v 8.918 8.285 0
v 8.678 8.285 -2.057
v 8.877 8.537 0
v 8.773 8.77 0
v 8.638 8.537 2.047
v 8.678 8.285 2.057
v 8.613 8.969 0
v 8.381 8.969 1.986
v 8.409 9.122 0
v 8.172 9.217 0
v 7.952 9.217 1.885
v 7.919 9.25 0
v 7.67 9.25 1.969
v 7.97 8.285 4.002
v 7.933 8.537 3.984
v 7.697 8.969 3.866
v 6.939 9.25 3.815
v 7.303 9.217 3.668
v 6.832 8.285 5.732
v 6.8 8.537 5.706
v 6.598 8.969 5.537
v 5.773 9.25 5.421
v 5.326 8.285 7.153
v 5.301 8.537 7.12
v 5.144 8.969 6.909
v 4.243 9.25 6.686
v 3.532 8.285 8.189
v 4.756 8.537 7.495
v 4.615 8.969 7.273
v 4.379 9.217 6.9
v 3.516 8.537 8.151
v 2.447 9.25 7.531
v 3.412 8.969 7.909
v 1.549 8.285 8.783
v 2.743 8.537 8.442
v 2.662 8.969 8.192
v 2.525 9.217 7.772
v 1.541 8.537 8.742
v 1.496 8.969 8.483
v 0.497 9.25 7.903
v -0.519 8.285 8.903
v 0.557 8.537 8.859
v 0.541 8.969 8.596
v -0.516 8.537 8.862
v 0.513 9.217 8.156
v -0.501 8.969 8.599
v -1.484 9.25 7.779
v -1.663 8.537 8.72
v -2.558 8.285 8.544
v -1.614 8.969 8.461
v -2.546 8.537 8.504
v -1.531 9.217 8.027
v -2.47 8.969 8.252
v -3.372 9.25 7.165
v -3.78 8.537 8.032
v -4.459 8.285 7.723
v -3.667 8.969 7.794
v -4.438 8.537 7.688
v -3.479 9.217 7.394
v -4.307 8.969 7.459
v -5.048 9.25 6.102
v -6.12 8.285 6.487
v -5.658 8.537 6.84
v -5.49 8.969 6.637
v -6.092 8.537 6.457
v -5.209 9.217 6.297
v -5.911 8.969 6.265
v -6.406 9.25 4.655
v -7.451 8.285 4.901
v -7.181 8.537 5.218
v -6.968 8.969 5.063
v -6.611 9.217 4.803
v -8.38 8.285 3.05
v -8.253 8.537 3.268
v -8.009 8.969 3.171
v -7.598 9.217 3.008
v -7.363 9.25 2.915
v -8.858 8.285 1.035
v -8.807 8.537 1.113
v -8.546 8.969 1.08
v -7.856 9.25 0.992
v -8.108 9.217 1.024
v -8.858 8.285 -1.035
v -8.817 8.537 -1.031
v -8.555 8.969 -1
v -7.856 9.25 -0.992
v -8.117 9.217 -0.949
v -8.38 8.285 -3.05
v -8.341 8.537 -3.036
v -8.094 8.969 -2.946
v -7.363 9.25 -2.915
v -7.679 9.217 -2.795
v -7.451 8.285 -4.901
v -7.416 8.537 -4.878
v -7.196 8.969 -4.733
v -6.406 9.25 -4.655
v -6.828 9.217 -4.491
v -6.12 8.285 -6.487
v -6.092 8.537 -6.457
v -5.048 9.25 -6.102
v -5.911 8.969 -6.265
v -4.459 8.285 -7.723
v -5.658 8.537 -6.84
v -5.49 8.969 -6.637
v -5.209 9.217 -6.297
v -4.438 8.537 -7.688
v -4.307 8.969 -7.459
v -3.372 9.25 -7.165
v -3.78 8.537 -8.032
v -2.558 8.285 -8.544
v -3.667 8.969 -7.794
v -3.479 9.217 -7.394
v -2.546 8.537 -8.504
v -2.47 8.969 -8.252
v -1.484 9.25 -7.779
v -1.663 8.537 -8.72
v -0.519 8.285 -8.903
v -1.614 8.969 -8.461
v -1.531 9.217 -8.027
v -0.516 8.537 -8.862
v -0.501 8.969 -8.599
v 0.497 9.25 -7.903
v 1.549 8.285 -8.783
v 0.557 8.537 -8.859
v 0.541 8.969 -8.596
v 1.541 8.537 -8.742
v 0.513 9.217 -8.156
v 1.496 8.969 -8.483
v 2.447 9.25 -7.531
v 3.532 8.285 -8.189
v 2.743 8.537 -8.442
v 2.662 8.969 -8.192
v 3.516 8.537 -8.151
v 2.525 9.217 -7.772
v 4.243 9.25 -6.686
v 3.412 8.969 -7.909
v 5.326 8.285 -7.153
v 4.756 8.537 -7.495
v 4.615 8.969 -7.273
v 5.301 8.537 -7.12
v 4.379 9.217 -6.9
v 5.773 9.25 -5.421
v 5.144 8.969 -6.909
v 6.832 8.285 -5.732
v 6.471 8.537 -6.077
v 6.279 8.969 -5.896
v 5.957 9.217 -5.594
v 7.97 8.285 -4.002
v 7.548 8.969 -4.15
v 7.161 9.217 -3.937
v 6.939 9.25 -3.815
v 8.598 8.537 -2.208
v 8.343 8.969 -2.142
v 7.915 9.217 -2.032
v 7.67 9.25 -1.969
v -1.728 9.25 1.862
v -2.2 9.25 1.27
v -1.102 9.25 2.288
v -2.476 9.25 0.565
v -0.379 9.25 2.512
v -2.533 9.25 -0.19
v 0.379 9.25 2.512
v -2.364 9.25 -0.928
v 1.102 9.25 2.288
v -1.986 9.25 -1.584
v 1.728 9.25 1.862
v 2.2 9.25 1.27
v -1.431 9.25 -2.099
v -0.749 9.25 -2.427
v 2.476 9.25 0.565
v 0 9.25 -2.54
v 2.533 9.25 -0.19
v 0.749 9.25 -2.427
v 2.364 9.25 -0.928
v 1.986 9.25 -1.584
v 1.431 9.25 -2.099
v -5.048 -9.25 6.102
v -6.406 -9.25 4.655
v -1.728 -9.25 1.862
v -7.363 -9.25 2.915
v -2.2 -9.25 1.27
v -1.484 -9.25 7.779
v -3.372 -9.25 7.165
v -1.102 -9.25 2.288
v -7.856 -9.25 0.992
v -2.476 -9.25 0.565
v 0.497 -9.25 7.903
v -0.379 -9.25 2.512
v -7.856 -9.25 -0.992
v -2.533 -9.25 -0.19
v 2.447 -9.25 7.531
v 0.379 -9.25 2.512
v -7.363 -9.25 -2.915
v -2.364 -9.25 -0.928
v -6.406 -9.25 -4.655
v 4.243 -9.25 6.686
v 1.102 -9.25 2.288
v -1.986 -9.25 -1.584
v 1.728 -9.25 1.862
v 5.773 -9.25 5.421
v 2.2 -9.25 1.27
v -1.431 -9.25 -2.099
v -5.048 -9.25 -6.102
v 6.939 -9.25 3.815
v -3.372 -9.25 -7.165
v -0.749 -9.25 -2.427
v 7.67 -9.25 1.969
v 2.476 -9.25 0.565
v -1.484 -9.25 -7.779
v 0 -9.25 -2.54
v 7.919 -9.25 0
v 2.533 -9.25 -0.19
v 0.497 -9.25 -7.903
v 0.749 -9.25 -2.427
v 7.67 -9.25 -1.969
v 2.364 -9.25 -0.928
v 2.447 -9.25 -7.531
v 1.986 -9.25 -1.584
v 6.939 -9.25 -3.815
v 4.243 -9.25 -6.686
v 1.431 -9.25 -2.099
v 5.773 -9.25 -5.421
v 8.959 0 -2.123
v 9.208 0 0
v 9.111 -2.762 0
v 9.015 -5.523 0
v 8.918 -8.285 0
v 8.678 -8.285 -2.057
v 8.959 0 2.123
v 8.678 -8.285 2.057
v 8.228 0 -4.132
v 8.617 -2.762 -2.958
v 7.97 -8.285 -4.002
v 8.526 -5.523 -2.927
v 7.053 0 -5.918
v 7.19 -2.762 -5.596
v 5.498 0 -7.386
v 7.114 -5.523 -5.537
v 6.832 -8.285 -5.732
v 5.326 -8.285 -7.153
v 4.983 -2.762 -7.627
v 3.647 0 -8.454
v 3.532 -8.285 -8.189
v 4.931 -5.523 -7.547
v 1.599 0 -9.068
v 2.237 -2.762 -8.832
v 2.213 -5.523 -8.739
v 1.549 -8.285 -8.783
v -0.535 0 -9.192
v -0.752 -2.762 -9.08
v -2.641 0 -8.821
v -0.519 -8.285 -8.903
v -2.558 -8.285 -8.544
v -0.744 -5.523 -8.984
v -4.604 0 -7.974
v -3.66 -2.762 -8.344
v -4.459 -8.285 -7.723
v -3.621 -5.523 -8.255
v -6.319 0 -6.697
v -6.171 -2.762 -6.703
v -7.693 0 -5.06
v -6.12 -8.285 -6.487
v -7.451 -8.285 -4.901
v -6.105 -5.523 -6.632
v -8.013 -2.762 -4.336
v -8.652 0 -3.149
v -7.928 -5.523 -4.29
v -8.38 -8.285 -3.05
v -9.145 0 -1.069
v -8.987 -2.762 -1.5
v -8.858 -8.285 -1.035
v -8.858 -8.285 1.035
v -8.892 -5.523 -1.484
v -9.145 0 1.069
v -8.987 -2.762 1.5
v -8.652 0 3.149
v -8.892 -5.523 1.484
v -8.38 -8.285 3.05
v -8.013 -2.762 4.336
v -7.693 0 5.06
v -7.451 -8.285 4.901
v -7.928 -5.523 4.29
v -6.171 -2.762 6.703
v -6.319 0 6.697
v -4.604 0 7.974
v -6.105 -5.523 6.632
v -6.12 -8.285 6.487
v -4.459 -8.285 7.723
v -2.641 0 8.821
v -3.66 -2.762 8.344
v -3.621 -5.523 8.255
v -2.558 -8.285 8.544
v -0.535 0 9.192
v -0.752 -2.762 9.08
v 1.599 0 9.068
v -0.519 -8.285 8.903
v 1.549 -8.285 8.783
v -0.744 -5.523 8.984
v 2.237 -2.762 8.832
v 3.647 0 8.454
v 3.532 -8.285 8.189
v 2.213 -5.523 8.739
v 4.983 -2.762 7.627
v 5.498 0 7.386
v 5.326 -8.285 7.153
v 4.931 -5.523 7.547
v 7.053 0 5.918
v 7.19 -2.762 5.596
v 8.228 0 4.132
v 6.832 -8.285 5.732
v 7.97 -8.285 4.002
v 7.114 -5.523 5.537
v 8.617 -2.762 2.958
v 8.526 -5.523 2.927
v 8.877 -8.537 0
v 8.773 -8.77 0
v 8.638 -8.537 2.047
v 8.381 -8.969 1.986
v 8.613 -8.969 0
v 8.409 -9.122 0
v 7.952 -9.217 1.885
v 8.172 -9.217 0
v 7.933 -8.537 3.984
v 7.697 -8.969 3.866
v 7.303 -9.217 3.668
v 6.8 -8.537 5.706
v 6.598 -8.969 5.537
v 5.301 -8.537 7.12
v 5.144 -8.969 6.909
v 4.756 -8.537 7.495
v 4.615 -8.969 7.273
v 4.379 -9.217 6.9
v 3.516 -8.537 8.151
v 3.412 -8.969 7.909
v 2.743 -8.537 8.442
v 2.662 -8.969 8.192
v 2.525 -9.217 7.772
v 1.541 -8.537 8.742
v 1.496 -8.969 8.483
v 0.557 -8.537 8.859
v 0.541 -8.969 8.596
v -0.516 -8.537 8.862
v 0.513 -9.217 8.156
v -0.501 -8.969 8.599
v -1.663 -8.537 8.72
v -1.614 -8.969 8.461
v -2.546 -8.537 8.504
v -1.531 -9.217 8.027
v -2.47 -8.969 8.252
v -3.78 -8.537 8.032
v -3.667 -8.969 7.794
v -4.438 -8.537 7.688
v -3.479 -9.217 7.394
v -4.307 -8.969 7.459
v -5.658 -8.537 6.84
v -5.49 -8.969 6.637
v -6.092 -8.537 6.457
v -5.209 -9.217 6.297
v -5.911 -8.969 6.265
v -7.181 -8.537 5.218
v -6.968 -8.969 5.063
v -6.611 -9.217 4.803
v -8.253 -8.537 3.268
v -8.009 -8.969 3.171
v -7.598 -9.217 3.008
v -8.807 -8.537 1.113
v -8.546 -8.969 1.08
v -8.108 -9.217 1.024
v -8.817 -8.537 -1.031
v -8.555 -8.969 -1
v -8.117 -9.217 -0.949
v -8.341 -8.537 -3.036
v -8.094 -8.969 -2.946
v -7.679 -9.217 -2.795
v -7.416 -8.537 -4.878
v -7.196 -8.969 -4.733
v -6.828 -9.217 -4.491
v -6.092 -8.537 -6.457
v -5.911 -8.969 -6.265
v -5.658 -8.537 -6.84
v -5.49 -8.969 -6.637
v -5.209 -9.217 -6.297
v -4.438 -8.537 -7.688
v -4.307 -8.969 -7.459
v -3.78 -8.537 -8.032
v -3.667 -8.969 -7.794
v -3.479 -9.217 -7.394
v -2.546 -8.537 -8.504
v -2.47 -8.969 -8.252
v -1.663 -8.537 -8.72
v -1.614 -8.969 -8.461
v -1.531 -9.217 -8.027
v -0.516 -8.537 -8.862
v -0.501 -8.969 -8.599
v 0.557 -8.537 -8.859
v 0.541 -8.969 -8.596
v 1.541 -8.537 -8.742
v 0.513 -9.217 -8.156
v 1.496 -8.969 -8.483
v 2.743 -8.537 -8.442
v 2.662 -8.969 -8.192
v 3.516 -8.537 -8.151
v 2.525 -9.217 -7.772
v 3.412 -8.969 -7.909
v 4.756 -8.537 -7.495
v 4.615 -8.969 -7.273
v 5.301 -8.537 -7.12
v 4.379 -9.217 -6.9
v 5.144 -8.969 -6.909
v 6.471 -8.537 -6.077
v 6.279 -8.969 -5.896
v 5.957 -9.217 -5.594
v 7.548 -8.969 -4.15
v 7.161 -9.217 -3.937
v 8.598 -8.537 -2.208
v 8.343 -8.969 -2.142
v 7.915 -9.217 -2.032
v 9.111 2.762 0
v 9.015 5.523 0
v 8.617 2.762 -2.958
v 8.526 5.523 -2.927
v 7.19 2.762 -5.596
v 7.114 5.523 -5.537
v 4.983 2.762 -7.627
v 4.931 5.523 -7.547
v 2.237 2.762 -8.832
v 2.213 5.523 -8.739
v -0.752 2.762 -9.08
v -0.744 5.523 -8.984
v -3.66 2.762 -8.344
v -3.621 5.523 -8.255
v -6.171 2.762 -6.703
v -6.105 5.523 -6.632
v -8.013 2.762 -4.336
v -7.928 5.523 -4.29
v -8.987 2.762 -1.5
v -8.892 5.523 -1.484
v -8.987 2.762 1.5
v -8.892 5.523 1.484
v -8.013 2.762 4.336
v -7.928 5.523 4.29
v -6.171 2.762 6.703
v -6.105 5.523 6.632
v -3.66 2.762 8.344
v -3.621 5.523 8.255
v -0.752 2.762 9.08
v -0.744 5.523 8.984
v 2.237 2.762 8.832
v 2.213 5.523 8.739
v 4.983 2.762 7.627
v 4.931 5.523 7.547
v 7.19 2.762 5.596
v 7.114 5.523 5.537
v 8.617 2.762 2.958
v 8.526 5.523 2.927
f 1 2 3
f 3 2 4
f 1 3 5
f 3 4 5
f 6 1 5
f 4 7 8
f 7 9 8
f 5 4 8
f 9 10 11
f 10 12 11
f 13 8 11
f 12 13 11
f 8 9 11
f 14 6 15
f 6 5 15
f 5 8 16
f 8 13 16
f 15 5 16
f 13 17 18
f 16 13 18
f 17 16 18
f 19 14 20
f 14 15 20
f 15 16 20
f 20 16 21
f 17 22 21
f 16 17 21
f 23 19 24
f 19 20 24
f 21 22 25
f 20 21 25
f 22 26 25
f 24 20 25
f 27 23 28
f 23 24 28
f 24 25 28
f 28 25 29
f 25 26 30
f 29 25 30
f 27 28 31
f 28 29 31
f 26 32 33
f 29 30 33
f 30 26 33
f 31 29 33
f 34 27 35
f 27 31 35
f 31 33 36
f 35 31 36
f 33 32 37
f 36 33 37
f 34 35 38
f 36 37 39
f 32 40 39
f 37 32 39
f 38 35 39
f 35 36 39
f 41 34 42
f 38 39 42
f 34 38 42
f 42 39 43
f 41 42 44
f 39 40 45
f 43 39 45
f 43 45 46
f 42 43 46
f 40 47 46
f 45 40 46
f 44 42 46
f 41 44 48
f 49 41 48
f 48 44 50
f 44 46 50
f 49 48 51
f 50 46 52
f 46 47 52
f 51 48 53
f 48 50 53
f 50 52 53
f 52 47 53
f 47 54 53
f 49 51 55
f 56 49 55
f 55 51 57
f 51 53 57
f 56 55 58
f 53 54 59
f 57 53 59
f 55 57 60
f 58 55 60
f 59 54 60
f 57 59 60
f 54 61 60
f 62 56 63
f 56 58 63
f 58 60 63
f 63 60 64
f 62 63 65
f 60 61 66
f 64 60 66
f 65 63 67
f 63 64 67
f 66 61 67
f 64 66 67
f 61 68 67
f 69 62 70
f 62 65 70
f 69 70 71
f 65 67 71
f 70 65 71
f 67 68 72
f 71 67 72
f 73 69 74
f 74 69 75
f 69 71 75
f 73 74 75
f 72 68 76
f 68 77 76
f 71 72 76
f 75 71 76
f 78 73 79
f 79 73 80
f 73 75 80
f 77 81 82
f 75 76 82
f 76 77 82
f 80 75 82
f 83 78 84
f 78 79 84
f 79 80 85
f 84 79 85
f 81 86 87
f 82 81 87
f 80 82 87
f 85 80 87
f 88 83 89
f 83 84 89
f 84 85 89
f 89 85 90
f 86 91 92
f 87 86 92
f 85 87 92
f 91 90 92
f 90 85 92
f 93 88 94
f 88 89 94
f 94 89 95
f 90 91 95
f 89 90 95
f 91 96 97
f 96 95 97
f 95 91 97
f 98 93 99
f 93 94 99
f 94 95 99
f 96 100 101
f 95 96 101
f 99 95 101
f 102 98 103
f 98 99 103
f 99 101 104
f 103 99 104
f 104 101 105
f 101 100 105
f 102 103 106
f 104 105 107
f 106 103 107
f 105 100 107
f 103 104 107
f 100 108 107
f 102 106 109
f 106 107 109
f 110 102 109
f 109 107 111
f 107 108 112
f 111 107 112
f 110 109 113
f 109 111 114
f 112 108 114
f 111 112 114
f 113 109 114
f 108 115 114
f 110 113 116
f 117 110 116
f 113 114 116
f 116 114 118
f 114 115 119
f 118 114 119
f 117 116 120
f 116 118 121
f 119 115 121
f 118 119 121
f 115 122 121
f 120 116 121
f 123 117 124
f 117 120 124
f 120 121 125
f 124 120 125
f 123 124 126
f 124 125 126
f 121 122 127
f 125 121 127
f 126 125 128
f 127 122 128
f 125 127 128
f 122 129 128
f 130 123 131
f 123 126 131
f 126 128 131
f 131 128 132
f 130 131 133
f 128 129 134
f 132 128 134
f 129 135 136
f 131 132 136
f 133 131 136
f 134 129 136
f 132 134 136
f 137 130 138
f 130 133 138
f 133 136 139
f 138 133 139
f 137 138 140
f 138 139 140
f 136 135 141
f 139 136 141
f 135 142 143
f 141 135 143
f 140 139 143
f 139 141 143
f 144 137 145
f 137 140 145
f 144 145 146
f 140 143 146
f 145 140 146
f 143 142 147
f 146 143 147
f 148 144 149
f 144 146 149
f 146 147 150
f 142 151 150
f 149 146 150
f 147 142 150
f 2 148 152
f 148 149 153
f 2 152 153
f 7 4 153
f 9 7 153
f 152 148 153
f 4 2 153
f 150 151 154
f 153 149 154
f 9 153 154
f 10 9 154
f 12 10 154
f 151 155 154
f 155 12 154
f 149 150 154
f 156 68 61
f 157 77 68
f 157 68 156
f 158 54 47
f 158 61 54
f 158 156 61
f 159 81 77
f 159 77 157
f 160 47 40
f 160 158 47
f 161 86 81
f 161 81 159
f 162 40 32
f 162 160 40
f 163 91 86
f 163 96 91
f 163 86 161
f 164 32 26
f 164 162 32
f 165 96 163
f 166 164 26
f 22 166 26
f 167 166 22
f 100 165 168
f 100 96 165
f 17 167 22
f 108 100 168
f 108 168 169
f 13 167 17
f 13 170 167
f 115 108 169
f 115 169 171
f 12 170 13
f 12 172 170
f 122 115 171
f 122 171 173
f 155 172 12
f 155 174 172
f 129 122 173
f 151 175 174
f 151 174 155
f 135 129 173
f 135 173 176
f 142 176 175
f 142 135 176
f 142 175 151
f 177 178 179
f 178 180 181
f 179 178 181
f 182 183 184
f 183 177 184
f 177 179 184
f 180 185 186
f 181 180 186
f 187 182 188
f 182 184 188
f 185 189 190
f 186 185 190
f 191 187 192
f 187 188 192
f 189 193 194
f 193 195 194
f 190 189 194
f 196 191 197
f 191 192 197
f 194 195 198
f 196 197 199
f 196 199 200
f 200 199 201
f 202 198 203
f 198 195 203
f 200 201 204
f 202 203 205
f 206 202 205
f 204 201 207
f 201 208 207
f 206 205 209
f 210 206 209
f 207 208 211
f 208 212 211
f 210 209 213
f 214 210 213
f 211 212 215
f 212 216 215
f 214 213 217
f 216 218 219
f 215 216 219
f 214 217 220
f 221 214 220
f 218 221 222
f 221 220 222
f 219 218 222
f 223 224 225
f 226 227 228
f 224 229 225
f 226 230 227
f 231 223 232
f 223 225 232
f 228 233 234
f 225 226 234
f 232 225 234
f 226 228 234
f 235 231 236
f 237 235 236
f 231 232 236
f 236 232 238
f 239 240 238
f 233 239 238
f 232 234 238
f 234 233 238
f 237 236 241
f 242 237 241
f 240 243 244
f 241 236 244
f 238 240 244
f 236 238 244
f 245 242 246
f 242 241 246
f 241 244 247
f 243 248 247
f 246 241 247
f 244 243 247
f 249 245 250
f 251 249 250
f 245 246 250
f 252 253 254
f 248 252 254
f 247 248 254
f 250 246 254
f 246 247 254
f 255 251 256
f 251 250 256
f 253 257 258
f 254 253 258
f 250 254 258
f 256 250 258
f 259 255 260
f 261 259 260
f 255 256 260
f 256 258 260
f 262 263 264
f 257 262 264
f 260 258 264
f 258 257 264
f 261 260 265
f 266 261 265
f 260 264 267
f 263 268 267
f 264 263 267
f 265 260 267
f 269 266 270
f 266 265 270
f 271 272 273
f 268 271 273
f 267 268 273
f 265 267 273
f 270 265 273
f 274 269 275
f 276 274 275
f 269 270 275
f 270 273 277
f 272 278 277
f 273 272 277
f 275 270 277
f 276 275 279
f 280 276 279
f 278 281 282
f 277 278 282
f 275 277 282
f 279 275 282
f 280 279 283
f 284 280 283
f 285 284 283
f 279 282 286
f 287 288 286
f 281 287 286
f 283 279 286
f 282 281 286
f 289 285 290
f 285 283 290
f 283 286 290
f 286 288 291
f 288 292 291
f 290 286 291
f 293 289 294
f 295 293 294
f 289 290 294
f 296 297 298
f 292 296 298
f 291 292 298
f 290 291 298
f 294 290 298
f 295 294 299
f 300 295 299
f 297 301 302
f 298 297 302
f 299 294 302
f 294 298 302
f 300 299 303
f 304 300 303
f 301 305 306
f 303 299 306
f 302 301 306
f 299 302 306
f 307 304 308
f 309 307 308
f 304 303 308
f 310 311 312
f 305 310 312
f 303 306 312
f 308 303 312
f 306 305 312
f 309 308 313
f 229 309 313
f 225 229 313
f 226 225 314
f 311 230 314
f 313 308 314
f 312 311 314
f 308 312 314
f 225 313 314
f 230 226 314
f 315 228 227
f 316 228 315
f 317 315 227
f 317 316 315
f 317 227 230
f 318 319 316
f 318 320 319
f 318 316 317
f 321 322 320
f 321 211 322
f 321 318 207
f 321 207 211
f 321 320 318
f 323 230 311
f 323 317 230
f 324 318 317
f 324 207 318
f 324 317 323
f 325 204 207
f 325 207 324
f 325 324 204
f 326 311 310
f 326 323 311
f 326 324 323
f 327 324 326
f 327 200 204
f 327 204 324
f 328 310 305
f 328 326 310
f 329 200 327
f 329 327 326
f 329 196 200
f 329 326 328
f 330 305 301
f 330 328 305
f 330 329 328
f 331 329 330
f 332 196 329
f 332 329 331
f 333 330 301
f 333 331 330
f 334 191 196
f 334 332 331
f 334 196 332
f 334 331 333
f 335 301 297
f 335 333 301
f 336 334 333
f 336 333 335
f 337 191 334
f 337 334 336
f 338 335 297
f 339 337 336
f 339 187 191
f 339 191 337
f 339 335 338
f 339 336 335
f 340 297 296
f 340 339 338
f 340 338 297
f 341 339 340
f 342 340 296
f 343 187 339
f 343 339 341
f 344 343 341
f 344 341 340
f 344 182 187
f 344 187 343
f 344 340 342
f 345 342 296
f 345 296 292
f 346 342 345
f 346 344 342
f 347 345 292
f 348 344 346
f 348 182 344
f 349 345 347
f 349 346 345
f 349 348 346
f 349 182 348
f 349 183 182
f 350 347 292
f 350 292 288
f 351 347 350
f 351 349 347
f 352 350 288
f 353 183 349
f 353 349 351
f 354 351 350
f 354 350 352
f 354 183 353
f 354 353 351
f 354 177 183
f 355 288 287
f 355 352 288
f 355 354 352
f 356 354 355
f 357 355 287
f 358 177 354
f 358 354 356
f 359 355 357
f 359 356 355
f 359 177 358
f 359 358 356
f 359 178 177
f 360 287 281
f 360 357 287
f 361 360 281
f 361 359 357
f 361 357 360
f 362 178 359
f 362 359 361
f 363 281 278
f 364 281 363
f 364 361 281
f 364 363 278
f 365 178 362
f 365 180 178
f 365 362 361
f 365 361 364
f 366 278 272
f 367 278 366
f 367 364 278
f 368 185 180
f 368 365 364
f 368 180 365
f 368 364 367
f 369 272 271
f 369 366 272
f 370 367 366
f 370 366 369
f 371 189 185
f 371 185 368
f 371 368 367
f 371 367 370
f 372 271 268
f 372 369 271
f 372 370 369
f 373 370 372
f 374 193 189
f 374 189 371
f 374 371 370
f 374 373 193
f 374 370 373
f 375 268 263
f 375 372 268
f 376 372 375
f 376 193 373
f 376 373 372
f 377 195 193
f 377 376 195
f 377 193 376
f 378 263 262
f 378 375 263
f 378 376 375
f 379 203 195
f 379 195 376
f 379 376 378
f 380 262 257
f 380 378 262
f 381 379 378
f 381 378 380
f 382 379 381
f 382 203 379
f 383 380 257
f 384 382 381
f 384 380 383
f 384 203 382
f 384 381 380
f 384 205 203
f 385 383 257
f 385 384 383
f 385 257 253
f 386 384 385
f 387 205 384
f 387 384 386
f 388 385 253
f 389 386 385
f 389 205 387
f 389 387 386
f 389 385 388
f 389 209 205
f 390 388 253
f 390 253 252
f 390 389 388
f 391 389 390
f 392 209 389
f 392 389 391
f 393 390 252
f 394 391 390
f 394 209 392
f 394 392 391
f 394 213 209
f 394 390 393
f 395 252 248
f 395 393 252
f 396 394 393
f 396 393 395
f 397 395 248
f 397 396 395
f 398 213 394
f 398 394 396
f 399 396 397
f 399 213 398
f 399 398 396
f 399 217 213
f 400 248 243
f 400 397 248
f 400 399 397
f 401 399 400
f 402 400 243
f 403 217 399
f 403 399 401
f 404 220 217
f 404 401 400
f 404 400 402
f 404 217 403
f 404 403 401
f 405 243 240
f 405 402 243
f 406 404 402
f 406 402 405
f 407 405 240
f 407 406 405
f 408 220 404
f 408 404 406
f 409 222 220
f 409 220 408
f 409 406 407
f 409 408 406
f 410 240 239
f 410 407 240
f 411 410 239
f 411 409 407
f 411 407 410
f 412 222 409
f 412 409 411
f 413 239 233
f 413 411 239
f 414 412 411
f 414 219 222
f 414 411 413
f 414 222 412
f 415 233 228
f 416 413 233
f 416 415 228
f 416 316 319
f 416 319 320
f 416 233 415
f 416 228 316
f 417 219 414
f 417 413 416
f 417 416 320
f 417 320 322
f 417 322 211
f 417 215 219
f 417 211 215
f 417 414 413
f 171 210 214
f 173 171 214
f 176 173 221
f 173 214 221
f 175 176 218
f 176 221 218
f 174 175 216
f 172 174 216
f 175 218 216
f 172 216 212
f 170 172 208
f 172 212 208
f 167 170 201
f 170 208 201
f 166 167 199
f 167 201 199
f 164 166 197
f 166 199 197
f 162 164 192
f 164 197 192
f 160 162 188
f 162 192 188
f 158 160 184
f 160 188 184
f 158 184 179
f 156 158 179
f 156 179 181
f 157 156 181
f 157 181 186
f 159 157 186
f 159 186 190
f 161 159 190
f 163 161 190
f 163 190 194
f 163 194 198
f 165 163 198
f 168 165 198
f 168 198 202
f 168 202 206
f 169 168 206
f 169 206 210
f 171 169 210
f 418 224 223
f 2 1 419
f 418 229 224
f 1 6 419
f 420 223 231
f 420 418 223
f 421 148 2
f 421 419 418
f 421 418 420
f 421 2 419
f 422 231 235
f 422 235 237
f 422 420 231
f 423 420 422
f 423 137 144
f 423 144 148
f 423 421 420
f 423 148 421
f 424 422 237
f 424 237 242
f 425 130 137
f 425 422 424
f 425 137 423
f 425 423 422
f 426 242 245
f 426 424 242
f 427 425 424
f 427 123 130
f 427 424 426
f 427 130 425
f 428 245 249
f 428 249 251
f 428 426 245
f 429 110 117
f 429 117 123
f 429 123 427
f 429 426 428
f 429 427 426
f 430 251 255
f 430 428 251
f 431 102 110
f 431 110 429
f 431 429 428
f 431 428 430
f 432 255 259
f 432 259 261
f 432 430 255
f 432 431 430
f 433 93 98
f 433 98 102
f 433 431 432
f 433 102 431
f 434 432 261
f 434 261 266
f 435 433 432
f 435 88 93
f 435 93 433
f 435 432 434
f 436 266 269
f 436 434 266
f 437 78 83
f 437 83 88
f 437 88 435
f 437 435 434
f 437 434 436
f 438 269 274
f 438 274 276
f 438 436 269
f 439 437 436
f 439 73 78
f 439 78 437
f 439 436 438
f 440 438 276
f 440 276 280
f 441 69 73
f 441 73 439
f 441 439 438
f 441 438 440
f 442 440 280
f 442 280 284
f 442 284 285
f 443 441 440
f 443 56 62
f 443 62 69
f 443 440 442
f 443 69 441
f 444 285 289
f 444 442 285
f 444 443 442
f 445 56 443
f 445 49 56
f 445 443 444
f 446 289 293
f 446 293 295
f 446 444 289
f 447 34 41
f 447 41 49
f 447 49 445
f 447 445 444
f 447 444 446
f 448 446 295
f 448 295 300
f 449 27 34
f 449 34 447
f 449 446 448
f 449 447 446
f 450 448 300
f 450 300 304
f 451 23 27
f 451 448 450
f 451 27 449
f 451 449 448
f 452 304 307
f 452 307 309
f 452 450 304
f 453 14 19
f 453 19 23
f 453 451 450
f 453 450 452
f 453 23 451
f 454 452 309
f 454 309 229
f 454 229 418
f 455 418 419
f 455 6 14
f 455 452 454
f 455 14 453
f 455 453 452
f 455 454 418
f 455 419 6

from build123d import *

# Parameters (mm, degrees)
SKETCH1_R           = 9.2075
BOSS_EXTRUDE1_DEPTH = 9.25
BOSS_EXTRUDE1_TAPER = 2
SKETCH2_R           = 2.54
CUT_EXTRUDE1_DEPTH  = 23.623132407
FILLET1_R           = 1


with BuildPart() as part:
    # Sketch1 → Boss-Extrude1 (new body)
    with BuildSketch(Plane(origin=(0, 0, 0), x_dir=(1, 0, 0), z_dir=(0, 1, 0))):
        Circle(SKETCH1_R)
    boss_extrude1 = extrude(amount=BOSS_EXTRUDE1_DEPTH, taper=BOSS_EXTRUDE1_TAPER)

    # Mirror1: Boss-Extrude1 across plane
    add(boss_extrude1.mirror(Plane.ZX))

    # Sketch2 → Cut-Extrude1 (cut, through all)
    with BuildSketch(Plane(origin=(0, -9.25, 0), x_dir=(-1, 0, 0), z_dir=(0, -1, 0))):
        with Locations(Location((0, 0, 0), (0, 0, 90))):
            Circle(SKETCH2_R)
    extrude(amount=-CUT_EXTRUDE1_DEPTH, mode=Mode.SUBTRACT)

    # Fillet1
    fillet1_edges = [part.edges().sort_by_distance(p)[0] for p in [
        (-8.884482882, 9.25, 0),
        (-8.884482882, -9.25, 0),
    ]]
    fillet(fillet1_edges, radius=FILLET1_R)


solid = part.part
